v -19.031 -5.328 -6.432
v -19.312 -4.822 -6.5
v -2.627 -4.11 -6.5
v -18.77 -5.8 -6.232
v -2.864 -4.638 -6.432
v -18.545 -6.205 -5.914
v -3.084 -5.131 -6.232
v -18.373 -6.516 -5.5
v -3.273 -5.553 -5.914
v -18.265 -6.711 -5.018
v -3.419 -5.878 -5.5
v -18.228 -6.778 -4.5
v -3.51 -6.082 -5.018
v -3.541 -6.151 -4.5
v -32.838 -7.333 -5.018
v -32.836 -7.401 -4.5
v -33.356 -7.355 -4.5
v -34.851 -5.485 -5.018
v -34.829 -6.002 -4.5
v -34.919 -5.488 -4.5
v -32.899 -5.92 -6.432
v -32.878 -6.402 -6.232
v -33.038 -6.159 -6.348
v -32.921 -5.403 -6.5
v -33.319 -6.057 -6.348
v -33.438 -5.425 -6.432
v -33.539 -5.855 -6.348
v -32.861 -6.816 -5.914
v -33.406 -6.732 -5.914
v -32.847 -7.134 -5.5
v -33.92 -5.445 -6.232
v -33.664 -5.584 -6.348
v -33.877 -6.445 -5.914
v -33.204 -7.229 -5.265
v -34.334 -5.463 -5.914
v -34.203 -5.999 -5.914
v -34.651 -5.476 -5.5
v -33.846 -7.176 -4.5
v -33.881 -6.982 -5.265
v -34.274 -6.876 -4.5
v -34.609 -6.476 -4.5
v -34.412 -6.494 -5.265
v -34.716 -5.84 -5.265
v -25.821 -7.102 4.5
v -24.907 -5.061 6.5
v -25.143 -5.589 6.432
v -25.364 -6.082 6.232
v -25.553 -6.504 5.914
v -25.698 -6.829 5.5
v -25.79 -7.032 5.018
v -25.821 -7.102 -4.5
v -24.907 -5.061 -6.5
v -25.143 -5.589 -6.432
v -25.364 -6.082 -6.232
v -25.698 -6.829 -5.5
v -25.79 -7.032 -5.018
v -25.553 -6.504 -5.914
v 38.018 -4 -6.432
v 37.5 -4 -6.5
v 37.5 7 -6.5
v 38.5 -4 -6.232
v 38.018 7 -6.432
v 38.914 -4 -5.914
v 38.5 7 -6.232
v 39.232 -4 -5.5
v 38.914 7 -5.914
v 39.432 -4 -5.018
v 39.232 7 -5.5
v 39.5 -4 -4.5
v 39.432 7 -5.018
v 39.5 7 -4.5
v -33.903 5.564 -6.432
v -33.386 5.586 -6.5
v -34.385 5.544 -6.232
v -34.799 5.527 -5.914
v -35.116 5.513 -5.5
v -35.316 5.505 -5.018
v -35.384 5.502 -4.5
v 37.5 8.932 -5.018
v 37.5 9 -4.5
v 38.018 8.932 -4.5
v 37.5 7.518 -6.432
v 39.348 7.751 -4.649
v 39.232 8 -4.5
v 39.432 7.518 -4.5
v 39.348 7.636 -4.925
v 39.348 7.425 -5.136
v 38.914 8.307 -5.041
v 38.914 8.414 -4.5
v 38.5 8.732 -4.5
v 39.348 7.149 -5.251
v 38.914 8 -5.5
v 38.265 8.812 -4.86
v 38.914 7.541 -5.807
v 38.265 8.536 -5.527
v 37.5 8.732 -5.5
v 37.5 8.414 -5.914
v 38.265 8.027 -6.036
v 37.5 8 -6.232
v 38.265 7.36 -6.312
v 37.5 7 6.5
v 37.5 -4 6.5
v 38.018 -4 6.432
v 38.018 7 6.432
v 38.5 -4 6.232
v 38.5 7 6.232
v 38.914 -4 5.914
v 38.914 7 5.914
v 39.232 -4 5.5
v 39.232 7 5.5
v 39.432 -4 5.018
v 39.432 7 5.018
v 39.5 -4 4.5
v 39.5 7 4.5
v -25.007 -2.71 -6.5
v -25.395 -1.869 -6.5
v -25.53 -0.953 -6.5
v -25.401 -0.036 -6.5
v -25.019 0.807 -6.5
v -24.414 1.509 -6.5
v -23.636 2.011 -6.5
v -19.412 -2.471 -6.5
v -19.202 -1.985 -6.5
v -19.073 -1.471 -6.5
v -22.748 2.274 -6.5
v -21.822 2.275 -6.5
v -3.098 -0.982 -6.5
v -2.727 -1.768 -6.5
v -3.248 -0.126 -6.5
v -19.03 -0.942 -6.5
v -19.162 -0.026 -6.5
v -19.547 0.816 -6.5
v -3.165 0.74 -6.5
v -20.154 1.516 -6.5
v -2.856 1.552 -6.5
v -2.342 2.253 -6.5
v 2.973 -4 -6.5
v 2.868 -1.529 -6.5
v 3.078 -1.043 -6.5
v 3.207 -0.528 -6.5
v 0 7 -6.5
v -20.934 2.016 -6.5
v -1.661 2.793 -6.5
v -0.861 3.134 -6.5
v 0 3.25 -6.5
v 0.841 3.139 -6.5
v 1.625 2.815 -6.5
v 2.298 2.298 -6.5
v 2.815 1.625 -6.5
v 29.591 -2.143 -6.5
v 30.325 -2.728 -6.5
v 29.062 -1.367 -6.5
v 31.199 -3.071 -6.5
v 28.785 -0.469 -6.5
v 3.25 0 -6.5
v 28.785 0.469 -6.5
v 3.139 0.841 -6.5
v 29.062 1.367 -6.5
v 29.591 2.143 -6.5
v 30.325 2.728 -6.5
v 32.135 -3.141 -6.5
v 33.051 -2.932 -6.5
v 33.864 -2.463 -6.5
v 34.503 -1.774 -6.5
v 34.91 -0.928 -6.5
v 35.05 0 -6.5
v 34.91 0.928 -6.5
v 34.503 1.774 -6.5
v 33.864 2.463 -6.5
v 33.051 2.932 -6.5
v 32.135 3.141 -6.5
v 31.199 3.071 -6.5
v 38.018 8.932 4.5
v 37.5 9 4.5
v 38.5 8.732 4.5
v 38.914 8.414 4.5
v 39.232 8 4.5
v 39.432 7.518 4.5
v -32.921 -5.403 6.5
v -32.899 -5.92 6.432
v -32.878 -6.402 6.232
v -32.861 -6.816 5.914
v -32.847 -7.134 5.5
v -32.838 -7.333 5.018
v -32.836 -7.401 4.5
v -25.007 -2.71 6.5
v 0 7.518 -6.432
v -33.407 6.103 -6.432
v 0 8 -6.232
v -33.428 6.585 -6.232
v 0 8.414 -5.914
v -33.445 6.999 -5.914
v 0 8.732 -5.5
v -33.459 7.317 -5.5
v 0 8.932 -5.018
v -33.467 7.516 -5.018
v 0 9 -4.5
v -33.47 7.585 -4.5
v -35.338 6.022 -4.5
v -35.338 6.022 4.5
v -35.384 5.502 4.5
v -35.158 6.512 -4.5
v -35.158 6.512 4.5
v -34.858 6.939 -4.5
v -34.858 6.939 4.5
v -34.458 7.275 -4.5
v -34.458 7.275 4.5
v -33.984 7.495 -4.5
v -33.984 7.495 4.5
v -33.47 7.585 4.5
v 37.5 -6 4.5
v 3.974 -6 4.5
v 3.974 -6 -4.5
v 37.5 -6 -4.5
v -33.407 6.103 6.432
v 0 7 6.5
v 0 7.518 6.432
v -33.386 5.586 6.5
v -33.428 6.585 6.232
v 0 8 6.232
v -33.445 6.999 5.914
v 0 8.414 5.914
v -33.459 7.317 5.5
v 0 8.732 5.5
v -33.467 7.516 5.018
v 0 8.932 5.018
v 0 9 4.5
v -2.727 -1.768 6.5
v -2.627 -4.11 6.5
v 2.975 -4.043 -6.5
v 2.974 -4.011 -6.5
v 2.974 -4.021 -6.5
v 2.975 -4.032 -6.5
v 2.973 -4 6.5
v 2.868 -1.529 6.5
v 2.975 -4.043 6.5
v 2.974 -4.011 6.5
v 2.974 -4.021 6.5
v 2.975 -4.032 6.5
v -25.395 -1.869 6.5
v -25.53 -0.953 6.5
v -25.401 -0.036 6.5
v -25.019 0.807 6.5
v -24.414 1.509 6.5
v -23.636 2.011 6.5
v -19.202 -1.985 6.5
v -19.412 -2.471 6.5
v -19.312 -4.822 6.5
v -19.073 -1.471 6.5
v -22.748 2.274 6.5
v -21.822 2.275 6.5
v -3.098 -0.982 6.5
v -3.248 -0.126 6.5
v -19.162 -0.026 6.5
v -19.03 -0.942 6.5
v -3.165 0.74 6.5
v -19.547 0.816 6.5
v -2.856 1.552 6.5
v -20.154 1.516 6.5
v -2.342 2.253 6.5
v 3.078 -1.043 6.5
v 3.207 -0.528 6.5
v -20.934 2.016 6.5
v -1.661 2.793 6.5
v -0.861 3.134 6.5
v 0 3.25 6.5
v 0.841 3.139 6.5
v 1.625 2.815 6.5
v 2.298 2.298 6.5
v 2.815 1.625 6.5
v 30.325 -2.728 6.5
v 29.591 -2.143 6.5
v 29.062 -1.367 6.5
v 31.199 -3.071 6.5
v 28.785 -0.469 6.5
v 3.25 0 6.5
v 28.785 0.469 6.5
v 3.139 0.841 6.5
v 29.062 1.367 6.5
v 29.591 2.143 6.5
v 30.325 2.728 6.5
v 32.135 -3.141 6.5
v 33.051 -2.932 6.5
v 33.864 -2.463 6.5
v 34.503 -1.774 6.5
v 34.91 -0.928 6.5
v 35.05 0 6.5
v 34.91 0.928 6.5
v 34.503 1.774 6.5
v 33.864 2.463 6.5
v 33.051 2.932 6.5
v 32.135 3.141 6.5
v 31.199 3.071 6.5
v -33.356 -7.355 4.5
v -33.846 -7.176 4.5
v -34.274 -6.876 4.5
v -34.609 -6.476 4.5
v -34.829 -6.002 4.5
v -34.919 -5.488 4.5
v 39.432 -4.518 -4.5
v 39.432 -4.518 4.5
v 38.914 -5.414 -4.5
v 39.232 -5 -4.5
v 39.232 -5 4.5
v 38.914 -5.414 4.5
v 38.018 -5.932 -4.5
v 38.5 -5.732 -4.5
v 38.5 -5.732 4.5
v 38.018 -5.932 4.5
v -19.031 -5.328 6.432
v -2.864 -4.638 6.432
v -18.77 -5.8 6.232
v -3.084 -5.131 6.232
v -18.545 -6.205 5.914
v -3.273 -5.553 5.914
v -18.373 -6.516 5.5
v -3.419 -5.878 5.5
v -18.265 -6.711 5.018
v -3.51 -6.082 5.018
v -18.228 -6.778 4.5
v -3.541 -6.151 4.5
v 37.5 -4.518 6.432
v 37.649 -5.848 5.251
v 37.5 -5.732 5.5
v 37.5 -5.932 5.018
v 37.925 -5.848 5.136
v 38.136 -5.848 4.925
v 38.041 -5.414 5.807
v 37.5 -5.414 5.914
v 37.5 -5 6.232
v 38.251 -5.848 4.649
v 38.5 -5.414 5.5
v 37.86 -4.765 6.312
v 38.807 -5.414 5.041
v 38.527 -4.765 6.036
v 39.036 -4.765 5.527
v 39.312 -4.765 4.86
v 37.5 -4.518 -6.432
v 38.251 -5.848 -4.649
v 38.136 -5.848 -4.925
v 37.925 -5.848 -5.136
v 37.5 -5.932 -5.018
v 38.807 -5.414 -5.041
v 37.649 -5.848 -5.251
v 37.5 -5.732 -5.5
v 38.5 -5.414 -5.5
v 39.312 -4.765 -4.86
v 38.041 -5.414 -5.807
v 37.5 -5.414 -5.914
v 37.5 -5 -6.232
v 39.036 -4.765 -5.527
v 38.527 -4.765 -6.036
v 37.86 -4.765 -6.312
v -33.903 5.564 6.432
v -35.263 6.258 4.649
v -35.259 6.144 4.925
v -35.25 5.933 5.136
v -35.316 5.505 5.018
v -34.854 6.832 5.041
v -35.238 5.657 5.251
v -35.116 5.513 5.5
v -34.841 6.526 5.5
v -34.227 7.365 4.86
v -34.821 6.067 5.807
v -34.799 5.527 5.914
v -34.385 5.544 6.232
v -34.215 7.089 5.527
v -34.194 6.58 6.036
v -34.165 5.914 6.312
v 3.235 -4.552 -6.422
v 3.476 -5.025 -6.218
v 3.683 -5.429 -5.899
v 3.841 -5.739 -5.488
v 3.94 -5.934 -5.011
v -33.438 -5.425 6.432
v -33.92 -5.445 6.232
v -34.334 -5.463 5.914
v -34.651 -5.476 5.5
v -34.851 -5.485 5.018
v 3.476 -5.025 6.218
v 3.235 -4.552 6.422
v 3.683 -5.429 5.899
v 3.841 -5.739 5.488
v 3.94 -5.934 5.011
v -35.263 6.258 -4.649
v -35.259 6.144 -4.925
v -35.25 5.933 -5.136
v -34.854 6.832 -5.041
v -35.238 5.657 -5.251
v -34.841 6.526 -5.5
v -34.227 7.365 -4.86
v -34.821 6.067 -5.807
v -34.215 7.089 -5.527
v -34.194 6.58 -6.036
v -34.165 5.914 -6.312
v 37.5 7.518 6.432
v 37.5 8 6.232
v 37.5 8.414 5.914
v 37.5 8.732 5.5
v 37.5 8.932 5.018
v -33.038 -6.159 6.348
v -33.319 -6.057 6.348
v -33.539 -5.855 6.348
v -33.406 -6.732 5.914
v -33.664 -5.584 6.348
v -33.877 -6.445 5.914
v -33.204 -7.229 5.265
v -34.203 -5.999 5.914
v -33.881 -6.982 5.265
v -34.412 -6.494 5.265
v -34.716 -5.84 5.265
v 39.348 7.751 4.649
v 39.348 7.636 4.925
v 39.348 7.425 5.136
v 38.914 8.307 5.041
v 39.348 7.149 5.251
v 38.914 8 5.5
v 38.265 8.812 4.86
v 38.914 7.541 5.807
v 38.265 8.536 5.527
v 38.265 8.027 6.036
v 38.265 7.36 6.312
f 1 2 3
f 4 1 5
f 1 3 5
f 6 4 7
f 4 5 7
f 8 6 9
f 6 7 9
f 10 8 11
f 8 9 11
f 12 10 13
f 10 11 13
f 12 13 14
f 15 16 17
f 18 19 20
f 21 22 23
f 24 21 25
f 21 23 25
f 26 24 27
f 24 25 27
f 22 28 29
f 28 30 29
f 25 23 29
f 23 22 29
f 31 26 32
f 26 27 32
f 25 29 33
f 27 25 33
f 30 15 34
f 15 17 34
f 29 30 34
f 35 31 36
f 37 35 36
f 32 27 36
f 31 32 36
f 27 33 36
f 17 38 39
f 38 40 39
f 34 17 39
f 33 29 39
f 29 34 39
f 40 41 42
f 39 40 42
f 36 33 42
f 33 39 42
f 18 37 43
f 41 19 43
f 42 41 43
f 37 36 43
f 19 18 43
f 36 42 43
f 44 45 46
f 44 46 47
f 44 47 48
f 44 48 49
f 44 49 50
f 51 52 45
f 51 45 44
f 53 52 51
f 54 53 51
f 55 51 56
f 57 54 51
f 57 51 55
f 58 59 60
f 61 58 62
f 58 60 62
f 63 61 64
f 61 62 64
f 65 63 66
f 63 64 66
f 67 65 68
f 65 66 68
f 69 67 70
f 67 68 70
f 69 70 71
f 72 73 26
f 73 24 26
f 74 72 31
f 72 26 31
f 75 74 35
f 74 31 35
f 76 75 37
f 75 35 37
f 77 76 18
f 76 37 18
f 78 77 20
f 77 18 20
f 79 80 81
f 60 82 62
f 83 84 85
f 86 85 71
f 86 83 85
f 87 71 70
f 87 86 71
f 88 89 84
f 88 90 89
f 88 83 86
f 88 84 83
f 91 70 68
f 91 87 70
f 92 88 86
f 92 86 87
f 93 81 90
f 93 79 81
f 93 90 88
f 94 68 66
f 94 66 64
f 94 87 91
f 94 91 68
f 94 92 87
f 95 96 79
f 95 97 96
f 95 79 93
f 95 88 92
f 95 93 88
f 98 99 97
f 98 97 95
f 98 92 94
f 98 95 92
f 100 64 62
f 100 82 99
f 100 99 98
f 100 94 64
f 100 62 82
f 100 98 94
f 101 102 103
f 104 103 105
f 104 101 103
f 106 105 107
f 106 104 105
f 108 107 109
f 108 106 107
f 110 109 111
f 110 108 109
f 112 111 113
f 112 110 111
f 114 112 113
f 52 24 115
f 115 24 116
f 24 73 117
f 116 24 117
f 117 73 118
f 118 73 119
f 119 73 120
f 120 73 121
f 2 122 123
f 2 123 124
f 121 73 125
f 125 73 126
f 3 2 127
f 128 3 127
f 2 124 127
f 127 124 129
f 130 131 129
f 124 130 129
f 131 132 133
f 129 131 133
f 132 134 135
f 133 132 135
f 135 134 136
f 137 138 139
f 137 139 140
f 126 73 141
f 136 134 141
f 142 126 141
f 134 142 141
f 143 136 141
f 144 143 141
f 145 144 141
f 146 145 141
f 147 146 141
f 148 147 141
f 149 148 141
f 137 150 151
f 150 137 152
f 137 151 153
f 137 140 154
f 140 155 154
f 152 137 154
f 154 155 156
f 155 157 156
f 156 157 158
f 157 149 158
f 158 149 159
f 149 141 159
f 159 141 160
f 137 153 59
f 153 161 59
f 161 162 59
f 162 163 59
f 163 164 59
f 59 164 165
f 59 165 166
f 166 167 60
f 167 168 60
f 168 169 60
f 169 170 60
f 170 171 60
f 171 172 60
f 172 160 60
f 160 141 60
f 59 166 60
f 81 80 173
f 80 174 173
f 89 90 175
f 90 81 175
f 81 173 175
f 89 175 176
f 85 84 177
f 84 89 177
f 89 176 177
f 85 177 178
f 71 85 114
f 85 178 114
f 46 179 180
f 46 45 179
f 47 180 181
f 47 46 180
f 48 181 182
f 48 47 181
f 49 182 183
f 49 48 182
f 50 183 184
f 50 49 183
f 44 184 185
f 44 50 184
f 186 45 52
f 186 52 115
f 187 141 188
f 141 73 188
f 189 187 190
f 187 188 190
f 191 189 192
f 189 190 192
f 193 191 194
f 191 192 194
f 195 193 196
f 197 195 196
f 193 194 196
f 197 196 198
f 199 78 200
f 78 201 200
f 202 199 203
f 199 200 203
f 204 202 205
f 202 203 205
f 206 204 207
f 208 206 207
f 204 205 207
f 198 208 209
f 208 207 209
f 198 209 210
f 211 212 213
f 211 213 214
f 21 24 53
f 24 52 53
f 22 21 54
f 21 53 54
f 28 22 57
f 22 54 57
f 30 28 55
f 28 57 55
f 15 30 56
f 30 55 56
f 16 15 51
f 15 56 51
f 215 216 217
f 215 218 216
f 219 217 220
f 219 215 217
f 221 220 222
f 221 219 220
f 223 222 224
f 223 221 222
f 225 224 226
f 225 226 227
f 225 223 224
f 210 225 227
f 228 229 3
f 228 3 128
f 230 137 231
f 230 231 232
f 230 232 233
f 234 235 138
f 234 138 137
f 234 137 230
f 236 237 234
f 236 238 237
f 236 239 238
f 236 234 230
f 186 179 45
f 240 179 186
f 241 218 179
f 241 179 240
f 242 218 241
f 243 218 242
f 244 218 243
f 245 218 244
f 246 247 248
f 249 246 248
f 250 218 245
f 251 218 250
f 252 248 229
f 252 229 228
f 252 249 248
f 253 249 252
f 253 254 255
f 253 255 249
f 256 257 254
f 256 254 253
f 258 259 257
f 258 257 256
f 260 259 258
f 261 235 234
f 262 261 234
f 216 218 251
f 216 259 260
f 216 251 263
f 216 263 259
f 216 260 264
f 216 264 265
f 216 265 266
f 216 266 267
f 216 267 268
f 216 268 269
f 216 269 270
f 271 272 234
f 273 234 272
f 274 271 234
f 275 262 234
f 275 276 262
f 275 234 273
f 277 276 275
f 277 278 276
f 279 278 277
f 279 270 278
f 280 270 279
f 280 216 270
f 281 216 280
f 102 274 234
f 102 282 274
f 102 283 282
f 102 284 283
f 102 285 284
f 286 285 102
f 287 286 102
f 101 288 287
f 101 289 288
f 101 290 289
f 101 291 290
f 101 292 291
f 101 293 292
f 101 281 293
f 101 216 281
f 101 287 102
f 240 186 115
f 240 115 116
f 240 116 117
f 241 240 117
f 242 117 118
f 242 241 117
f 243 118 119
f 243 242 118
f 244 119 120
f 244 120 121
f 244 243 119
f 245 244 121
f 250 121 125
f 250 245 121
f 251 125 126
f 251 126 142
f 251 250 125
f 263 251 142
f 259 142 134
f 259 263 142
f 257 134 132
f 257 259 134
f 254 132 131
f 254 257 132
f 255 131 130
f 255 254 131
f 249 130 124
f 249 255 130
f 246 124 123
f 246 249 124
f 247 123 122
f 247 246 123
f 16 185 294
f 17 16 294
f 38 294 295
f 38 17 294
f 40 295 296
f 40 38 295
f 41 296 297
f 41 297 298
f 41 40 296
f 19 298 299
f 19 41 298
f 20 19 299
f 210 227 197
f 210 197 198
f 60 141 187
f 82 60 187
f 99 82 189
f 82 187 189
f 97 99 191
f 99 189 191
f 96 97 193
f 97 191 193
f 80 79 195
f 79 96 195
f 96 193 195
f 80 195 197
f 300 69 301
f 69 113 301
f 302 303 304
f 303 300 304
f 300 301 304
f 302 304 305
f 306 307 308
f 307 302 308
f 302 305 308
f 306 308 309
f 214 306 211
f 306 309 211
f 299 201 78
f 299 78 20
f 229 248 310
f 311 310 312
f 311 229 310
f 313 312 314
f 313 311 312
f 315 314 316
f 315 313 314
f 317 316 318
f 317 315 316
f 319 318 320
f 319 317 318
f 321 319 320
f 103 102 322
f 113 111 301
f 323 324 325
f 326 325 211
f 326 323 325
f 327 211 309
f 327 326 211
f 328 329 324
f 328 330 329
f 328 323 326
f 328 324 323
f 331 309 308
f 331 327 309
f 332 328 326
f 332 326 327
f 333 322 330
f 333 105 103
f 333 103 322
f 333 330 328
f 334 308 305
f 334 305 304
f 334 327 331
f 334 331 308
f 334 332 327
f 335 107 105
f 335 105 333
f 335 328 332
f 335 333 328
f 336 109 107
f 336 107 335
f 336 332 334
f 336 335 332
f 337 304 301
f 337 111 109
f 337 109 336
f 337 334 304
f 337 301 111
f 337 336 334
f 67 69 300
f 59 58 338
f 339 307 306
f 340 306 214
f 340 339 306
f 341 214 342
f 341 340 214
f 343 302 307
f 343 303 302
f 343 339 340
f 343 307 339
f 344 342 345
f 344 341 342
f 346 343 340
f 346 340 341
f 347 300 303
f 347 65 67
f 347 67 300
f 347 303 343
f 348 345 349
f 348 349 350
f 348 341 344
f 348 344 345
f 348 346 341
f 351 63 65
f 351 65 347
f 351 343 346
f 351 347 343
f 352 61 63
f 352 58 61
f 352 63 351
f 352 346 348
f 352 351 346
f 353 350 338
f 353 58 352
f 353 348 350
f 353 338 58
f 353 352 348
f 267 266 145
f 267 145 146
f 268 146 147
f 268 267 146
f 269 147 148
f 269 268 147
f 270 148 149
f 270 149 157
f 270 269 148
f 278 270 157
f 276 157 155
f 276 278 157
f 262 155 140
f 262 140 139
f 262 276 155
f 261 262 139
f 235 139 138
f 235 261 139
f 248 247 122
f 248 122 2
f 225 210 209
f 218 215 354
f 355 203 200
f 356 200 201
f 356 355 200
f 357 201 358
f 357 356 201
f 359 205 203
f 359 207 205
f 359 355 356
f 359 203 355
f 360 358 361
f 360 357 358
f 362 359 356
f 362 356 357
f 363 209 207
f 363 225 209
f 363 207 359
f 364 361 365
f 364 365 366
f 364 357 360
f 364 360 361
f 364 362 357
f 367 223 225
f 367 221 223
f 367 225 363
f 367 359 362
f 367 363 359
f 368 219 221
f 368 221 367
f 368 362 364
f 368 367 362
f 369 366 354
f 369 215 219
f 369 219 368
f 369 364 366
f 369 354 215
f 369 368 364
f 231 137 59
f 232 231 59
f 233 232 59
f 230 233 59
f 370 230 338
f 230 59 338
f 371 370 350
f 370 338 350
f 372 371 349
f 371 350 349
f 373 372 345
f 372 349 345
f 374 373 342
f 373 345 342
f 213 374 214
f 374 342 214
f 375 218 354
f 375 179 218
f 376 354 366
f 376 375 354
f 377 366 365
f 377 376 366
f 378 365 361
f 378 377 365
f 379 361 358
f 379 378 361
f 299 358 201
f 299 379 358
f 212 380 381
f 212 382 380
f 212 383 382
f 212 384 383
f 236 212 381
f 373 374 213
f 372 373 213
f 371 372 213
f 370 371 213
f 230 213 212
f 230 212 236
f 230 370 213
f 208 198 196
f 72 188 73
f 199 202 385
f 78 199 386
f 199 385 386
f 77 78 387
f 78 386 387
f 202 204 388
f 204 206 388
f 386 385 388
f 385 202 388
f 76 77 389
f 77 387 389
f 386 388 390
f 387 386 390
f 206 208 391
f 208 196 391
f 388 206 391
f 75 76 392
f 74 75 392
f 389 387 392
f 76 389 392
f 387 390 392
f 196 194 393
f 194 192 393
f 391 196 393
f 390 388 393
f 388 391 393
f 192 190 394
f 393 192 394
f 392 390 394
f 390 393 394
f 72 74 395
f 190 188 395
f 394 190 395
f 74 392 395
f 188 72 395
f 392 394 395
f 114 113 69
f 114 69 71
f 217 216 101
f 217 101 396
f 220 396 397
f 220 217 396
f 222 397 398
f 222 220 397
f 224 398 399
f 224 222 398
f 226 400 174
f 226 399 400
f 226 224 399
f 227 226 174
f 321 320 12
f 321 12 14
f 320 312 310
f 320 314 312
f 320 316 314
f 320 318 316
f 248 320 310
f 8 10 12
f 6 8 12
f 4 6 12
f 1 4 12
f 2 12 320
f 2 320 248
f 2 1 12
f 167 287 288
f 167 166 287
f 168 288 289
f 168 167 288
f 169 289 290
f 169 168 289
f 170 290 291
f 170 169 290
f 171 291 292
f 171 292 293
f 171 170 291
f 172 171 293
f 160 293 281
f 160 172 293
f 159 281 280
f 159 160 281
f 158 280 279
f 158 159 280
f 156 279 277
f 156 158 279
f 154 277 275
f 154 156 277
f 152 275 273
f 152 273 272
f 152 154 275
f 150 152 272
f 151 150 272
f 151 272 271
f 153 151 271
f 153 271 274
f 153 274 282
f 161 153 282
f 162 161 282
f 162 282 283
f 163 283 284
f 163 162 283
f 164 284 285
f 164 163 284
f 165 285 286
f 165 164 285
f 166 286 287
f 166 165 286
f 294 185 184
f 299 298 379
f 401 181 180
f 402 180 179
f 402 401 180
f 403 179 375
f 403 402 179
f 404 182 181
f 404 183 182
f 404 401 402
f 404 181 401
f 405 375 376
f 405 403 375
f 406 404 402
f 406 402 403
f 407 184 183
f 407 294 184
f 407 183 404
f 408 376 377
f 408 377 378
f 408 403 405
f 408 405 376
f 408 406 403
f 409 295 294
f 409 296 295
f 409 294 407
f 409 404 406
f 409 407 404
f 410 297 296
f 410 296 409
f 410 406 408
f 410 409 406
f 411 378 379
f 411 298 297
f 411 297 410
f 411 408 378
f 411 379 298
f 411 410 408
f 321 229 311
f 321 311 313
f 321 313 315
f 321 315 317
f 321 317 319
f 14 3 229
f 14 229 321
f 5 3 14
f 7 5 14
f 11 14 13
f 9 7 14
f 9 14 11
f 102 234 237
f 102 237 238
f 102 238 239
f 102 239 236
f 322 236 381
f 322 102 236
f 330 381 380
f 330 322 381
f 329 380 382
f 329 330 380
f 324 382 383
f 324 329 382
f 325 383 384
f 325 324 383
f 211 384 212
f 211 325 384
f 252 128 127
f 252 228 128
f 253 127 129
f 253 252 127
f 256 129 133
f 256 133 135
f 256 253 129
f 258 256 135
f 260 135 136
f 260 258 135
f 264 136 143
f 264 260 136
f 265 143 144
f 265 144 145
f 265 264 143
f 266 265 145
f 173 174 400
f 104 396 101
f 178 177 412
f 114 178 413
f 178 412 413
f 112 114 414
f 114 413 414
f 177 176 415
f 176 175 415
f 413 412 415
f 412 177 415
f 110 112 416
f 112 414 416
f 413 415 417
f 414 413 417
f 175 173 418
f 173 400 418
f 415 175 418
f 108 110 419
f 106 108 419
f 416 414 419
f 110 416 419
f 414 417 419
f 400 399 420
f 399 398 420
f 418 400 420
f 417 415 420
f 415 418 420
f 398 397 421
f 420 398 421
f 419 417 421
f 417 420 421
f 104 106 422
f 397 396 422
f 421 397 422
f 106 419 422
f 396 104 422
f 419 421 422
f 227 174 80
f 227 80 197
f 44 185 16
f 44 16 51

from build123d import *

# Parameters (mm, degrees)
F0_R        = 3.15
F1_DEPTH    = 6.5
F2_T1_DEPTH = 23.3593154951
F2_T3_DEPTH = 23.1607876028
F4_R        = 2


# Not quite as in the source:
# - a fillet or chamfer that OpenCascade refuses, or shapes differently, is made with other operations: its cross-section is extruded or revolved along the edge and cut away or added
# - two fillets or chamfers of one size are made in one step


with BuildPart() as f1:
    # F0 (on Top) → F1 (new body, symmetric)
    with BuildSketch(Plane.XY):
        with BuildLine():
            ThreePointArc((-2.7271020198, -1.7678842082), (-2.8555317961, 1.5519143538), (0, 3.25))
            Line((0, 3.25), (0, 9))
            Line((0, 9), (-35.4682957019, 7.5))
            Line((-35.4682957019, 7.5), (-34.834492885, -7.4866038177))
            Line((-34.834492885, -7.4866038177), (-24.8215810327, -7.0592907796))
            Line((-24.8215810327, -7.0592907796), (-25.0071863621, -2.7101377293))
            ThreePointArc((-25.0071863621, -2.7101377293), (-23.2018810758, 2.1742815392), (-19.0300843423, -0.9422535211))
            ThreePointArc((-19.0300843423, -0.9422535211), (-19.1270804103, -1.7303310583), (-19.4122789298, -2.4713683356))
            Line((-19.4122789298, -2.4713683356), (-19.2266736003, -6.8205213858))
            Line((-19.2266736003, -6.8205213858), (-2.5418620091, -6.1084770138))
            Line((-2.5418620091, -6.1084770138), (-2.7271020198, -1.7678842082))
        make_face()
        with BuildLine():
            ThreePointArc((3.25, 0), (3.153003932, -0.7880775372), (2.8678054126, -1.5291148144))
            Line((2.8678054126, -1.5291148144), (3.0586058071, -6))
            Line((3.0586058071, -6), (39.5, -6))
            Line((39.5, -6), (39.5, 9))
            Line((39.5, 9), (0, 9))
            Line((0, 9), (0, 3.25))
            ThreePointArc((0, 3.25), (2.2980970389, 2.2980970389), (3.25, 0))
        make_face()
        with Locations((31.9, 0)):
            Circle(F0_R, mode=Mode.SUBTRACT)
    extrude(amount=F1_DEPTH, both=True)

    # F2: chamfer of 2 x 1 on 4 edges, made by hand

    # F2_s2 → F2_t1 (cut)
    with BuildSketch(Plane.XY.offset(-11.6796577476)):
        Polygon((-24.9068558162, -5.0611095538), (-25.8206716456, -7.1019281713), (-24.8215810327, -7.0592907796), align=None)
        Polygon((-2.6271367926, -4.110295788), (-3.540952622, -6.1511144056), (-2.5418620091, -6.1084770138), align=None)
        Polygon((-18.2275829874, -6.7778839941), (-19.3119483838, -4.82234016), (-19.2266736003, -6.8205213858), align=None)
    extrude(amount=F2_T1_DEPTH, mode=Mode.SUBTRACT)

    # F2_s4 → F2_t3 (cut)
    with BuildSketch(Plane.XY.offset(-11.5803938014)):
        Polygon((3.97416362, -6), (2.9750730071, -4.0426373917), (3.0586058071, -6), align=None)
    extrude(amount=F2_T3_DEPTH, mode=Mode.SUBTRACT)

    # F4
    f4_edges = [f1.edges().sort_by_distance(p)[0] for p in [
        (-17.734148, 8.25, 6.5),
        (19.75, 9, 6.5),
        (-17.734148, 8.25, -6.5),
        (19.75, 9, -6.5),
        (-35.468296, 7.5, 0),
        (39.5, 9, 0),
        (39.5, 1.5, 6.5),
        (39.5, 1.5, -6.5),
        (-35.151394, 0.006698, -6.5),
        (-35.151394, 0.006698, 6.5),
        (-34.834493, -7.486604, 0),
        (-30.327582, -7.294266, -6.5),
        (-30.327582, -7.294266, 6.5),
        (-10.884268, -6.464499, 6.5),
        (-10.884268, -6.464499, -6.5),
        (21.737082, -6, 6.5),
        (39.5, -6, 0),
        (21.737082, -6, -6.5),
    ]]
    fillet(f4_edges, radius=F4_R)


solid = f1.part
